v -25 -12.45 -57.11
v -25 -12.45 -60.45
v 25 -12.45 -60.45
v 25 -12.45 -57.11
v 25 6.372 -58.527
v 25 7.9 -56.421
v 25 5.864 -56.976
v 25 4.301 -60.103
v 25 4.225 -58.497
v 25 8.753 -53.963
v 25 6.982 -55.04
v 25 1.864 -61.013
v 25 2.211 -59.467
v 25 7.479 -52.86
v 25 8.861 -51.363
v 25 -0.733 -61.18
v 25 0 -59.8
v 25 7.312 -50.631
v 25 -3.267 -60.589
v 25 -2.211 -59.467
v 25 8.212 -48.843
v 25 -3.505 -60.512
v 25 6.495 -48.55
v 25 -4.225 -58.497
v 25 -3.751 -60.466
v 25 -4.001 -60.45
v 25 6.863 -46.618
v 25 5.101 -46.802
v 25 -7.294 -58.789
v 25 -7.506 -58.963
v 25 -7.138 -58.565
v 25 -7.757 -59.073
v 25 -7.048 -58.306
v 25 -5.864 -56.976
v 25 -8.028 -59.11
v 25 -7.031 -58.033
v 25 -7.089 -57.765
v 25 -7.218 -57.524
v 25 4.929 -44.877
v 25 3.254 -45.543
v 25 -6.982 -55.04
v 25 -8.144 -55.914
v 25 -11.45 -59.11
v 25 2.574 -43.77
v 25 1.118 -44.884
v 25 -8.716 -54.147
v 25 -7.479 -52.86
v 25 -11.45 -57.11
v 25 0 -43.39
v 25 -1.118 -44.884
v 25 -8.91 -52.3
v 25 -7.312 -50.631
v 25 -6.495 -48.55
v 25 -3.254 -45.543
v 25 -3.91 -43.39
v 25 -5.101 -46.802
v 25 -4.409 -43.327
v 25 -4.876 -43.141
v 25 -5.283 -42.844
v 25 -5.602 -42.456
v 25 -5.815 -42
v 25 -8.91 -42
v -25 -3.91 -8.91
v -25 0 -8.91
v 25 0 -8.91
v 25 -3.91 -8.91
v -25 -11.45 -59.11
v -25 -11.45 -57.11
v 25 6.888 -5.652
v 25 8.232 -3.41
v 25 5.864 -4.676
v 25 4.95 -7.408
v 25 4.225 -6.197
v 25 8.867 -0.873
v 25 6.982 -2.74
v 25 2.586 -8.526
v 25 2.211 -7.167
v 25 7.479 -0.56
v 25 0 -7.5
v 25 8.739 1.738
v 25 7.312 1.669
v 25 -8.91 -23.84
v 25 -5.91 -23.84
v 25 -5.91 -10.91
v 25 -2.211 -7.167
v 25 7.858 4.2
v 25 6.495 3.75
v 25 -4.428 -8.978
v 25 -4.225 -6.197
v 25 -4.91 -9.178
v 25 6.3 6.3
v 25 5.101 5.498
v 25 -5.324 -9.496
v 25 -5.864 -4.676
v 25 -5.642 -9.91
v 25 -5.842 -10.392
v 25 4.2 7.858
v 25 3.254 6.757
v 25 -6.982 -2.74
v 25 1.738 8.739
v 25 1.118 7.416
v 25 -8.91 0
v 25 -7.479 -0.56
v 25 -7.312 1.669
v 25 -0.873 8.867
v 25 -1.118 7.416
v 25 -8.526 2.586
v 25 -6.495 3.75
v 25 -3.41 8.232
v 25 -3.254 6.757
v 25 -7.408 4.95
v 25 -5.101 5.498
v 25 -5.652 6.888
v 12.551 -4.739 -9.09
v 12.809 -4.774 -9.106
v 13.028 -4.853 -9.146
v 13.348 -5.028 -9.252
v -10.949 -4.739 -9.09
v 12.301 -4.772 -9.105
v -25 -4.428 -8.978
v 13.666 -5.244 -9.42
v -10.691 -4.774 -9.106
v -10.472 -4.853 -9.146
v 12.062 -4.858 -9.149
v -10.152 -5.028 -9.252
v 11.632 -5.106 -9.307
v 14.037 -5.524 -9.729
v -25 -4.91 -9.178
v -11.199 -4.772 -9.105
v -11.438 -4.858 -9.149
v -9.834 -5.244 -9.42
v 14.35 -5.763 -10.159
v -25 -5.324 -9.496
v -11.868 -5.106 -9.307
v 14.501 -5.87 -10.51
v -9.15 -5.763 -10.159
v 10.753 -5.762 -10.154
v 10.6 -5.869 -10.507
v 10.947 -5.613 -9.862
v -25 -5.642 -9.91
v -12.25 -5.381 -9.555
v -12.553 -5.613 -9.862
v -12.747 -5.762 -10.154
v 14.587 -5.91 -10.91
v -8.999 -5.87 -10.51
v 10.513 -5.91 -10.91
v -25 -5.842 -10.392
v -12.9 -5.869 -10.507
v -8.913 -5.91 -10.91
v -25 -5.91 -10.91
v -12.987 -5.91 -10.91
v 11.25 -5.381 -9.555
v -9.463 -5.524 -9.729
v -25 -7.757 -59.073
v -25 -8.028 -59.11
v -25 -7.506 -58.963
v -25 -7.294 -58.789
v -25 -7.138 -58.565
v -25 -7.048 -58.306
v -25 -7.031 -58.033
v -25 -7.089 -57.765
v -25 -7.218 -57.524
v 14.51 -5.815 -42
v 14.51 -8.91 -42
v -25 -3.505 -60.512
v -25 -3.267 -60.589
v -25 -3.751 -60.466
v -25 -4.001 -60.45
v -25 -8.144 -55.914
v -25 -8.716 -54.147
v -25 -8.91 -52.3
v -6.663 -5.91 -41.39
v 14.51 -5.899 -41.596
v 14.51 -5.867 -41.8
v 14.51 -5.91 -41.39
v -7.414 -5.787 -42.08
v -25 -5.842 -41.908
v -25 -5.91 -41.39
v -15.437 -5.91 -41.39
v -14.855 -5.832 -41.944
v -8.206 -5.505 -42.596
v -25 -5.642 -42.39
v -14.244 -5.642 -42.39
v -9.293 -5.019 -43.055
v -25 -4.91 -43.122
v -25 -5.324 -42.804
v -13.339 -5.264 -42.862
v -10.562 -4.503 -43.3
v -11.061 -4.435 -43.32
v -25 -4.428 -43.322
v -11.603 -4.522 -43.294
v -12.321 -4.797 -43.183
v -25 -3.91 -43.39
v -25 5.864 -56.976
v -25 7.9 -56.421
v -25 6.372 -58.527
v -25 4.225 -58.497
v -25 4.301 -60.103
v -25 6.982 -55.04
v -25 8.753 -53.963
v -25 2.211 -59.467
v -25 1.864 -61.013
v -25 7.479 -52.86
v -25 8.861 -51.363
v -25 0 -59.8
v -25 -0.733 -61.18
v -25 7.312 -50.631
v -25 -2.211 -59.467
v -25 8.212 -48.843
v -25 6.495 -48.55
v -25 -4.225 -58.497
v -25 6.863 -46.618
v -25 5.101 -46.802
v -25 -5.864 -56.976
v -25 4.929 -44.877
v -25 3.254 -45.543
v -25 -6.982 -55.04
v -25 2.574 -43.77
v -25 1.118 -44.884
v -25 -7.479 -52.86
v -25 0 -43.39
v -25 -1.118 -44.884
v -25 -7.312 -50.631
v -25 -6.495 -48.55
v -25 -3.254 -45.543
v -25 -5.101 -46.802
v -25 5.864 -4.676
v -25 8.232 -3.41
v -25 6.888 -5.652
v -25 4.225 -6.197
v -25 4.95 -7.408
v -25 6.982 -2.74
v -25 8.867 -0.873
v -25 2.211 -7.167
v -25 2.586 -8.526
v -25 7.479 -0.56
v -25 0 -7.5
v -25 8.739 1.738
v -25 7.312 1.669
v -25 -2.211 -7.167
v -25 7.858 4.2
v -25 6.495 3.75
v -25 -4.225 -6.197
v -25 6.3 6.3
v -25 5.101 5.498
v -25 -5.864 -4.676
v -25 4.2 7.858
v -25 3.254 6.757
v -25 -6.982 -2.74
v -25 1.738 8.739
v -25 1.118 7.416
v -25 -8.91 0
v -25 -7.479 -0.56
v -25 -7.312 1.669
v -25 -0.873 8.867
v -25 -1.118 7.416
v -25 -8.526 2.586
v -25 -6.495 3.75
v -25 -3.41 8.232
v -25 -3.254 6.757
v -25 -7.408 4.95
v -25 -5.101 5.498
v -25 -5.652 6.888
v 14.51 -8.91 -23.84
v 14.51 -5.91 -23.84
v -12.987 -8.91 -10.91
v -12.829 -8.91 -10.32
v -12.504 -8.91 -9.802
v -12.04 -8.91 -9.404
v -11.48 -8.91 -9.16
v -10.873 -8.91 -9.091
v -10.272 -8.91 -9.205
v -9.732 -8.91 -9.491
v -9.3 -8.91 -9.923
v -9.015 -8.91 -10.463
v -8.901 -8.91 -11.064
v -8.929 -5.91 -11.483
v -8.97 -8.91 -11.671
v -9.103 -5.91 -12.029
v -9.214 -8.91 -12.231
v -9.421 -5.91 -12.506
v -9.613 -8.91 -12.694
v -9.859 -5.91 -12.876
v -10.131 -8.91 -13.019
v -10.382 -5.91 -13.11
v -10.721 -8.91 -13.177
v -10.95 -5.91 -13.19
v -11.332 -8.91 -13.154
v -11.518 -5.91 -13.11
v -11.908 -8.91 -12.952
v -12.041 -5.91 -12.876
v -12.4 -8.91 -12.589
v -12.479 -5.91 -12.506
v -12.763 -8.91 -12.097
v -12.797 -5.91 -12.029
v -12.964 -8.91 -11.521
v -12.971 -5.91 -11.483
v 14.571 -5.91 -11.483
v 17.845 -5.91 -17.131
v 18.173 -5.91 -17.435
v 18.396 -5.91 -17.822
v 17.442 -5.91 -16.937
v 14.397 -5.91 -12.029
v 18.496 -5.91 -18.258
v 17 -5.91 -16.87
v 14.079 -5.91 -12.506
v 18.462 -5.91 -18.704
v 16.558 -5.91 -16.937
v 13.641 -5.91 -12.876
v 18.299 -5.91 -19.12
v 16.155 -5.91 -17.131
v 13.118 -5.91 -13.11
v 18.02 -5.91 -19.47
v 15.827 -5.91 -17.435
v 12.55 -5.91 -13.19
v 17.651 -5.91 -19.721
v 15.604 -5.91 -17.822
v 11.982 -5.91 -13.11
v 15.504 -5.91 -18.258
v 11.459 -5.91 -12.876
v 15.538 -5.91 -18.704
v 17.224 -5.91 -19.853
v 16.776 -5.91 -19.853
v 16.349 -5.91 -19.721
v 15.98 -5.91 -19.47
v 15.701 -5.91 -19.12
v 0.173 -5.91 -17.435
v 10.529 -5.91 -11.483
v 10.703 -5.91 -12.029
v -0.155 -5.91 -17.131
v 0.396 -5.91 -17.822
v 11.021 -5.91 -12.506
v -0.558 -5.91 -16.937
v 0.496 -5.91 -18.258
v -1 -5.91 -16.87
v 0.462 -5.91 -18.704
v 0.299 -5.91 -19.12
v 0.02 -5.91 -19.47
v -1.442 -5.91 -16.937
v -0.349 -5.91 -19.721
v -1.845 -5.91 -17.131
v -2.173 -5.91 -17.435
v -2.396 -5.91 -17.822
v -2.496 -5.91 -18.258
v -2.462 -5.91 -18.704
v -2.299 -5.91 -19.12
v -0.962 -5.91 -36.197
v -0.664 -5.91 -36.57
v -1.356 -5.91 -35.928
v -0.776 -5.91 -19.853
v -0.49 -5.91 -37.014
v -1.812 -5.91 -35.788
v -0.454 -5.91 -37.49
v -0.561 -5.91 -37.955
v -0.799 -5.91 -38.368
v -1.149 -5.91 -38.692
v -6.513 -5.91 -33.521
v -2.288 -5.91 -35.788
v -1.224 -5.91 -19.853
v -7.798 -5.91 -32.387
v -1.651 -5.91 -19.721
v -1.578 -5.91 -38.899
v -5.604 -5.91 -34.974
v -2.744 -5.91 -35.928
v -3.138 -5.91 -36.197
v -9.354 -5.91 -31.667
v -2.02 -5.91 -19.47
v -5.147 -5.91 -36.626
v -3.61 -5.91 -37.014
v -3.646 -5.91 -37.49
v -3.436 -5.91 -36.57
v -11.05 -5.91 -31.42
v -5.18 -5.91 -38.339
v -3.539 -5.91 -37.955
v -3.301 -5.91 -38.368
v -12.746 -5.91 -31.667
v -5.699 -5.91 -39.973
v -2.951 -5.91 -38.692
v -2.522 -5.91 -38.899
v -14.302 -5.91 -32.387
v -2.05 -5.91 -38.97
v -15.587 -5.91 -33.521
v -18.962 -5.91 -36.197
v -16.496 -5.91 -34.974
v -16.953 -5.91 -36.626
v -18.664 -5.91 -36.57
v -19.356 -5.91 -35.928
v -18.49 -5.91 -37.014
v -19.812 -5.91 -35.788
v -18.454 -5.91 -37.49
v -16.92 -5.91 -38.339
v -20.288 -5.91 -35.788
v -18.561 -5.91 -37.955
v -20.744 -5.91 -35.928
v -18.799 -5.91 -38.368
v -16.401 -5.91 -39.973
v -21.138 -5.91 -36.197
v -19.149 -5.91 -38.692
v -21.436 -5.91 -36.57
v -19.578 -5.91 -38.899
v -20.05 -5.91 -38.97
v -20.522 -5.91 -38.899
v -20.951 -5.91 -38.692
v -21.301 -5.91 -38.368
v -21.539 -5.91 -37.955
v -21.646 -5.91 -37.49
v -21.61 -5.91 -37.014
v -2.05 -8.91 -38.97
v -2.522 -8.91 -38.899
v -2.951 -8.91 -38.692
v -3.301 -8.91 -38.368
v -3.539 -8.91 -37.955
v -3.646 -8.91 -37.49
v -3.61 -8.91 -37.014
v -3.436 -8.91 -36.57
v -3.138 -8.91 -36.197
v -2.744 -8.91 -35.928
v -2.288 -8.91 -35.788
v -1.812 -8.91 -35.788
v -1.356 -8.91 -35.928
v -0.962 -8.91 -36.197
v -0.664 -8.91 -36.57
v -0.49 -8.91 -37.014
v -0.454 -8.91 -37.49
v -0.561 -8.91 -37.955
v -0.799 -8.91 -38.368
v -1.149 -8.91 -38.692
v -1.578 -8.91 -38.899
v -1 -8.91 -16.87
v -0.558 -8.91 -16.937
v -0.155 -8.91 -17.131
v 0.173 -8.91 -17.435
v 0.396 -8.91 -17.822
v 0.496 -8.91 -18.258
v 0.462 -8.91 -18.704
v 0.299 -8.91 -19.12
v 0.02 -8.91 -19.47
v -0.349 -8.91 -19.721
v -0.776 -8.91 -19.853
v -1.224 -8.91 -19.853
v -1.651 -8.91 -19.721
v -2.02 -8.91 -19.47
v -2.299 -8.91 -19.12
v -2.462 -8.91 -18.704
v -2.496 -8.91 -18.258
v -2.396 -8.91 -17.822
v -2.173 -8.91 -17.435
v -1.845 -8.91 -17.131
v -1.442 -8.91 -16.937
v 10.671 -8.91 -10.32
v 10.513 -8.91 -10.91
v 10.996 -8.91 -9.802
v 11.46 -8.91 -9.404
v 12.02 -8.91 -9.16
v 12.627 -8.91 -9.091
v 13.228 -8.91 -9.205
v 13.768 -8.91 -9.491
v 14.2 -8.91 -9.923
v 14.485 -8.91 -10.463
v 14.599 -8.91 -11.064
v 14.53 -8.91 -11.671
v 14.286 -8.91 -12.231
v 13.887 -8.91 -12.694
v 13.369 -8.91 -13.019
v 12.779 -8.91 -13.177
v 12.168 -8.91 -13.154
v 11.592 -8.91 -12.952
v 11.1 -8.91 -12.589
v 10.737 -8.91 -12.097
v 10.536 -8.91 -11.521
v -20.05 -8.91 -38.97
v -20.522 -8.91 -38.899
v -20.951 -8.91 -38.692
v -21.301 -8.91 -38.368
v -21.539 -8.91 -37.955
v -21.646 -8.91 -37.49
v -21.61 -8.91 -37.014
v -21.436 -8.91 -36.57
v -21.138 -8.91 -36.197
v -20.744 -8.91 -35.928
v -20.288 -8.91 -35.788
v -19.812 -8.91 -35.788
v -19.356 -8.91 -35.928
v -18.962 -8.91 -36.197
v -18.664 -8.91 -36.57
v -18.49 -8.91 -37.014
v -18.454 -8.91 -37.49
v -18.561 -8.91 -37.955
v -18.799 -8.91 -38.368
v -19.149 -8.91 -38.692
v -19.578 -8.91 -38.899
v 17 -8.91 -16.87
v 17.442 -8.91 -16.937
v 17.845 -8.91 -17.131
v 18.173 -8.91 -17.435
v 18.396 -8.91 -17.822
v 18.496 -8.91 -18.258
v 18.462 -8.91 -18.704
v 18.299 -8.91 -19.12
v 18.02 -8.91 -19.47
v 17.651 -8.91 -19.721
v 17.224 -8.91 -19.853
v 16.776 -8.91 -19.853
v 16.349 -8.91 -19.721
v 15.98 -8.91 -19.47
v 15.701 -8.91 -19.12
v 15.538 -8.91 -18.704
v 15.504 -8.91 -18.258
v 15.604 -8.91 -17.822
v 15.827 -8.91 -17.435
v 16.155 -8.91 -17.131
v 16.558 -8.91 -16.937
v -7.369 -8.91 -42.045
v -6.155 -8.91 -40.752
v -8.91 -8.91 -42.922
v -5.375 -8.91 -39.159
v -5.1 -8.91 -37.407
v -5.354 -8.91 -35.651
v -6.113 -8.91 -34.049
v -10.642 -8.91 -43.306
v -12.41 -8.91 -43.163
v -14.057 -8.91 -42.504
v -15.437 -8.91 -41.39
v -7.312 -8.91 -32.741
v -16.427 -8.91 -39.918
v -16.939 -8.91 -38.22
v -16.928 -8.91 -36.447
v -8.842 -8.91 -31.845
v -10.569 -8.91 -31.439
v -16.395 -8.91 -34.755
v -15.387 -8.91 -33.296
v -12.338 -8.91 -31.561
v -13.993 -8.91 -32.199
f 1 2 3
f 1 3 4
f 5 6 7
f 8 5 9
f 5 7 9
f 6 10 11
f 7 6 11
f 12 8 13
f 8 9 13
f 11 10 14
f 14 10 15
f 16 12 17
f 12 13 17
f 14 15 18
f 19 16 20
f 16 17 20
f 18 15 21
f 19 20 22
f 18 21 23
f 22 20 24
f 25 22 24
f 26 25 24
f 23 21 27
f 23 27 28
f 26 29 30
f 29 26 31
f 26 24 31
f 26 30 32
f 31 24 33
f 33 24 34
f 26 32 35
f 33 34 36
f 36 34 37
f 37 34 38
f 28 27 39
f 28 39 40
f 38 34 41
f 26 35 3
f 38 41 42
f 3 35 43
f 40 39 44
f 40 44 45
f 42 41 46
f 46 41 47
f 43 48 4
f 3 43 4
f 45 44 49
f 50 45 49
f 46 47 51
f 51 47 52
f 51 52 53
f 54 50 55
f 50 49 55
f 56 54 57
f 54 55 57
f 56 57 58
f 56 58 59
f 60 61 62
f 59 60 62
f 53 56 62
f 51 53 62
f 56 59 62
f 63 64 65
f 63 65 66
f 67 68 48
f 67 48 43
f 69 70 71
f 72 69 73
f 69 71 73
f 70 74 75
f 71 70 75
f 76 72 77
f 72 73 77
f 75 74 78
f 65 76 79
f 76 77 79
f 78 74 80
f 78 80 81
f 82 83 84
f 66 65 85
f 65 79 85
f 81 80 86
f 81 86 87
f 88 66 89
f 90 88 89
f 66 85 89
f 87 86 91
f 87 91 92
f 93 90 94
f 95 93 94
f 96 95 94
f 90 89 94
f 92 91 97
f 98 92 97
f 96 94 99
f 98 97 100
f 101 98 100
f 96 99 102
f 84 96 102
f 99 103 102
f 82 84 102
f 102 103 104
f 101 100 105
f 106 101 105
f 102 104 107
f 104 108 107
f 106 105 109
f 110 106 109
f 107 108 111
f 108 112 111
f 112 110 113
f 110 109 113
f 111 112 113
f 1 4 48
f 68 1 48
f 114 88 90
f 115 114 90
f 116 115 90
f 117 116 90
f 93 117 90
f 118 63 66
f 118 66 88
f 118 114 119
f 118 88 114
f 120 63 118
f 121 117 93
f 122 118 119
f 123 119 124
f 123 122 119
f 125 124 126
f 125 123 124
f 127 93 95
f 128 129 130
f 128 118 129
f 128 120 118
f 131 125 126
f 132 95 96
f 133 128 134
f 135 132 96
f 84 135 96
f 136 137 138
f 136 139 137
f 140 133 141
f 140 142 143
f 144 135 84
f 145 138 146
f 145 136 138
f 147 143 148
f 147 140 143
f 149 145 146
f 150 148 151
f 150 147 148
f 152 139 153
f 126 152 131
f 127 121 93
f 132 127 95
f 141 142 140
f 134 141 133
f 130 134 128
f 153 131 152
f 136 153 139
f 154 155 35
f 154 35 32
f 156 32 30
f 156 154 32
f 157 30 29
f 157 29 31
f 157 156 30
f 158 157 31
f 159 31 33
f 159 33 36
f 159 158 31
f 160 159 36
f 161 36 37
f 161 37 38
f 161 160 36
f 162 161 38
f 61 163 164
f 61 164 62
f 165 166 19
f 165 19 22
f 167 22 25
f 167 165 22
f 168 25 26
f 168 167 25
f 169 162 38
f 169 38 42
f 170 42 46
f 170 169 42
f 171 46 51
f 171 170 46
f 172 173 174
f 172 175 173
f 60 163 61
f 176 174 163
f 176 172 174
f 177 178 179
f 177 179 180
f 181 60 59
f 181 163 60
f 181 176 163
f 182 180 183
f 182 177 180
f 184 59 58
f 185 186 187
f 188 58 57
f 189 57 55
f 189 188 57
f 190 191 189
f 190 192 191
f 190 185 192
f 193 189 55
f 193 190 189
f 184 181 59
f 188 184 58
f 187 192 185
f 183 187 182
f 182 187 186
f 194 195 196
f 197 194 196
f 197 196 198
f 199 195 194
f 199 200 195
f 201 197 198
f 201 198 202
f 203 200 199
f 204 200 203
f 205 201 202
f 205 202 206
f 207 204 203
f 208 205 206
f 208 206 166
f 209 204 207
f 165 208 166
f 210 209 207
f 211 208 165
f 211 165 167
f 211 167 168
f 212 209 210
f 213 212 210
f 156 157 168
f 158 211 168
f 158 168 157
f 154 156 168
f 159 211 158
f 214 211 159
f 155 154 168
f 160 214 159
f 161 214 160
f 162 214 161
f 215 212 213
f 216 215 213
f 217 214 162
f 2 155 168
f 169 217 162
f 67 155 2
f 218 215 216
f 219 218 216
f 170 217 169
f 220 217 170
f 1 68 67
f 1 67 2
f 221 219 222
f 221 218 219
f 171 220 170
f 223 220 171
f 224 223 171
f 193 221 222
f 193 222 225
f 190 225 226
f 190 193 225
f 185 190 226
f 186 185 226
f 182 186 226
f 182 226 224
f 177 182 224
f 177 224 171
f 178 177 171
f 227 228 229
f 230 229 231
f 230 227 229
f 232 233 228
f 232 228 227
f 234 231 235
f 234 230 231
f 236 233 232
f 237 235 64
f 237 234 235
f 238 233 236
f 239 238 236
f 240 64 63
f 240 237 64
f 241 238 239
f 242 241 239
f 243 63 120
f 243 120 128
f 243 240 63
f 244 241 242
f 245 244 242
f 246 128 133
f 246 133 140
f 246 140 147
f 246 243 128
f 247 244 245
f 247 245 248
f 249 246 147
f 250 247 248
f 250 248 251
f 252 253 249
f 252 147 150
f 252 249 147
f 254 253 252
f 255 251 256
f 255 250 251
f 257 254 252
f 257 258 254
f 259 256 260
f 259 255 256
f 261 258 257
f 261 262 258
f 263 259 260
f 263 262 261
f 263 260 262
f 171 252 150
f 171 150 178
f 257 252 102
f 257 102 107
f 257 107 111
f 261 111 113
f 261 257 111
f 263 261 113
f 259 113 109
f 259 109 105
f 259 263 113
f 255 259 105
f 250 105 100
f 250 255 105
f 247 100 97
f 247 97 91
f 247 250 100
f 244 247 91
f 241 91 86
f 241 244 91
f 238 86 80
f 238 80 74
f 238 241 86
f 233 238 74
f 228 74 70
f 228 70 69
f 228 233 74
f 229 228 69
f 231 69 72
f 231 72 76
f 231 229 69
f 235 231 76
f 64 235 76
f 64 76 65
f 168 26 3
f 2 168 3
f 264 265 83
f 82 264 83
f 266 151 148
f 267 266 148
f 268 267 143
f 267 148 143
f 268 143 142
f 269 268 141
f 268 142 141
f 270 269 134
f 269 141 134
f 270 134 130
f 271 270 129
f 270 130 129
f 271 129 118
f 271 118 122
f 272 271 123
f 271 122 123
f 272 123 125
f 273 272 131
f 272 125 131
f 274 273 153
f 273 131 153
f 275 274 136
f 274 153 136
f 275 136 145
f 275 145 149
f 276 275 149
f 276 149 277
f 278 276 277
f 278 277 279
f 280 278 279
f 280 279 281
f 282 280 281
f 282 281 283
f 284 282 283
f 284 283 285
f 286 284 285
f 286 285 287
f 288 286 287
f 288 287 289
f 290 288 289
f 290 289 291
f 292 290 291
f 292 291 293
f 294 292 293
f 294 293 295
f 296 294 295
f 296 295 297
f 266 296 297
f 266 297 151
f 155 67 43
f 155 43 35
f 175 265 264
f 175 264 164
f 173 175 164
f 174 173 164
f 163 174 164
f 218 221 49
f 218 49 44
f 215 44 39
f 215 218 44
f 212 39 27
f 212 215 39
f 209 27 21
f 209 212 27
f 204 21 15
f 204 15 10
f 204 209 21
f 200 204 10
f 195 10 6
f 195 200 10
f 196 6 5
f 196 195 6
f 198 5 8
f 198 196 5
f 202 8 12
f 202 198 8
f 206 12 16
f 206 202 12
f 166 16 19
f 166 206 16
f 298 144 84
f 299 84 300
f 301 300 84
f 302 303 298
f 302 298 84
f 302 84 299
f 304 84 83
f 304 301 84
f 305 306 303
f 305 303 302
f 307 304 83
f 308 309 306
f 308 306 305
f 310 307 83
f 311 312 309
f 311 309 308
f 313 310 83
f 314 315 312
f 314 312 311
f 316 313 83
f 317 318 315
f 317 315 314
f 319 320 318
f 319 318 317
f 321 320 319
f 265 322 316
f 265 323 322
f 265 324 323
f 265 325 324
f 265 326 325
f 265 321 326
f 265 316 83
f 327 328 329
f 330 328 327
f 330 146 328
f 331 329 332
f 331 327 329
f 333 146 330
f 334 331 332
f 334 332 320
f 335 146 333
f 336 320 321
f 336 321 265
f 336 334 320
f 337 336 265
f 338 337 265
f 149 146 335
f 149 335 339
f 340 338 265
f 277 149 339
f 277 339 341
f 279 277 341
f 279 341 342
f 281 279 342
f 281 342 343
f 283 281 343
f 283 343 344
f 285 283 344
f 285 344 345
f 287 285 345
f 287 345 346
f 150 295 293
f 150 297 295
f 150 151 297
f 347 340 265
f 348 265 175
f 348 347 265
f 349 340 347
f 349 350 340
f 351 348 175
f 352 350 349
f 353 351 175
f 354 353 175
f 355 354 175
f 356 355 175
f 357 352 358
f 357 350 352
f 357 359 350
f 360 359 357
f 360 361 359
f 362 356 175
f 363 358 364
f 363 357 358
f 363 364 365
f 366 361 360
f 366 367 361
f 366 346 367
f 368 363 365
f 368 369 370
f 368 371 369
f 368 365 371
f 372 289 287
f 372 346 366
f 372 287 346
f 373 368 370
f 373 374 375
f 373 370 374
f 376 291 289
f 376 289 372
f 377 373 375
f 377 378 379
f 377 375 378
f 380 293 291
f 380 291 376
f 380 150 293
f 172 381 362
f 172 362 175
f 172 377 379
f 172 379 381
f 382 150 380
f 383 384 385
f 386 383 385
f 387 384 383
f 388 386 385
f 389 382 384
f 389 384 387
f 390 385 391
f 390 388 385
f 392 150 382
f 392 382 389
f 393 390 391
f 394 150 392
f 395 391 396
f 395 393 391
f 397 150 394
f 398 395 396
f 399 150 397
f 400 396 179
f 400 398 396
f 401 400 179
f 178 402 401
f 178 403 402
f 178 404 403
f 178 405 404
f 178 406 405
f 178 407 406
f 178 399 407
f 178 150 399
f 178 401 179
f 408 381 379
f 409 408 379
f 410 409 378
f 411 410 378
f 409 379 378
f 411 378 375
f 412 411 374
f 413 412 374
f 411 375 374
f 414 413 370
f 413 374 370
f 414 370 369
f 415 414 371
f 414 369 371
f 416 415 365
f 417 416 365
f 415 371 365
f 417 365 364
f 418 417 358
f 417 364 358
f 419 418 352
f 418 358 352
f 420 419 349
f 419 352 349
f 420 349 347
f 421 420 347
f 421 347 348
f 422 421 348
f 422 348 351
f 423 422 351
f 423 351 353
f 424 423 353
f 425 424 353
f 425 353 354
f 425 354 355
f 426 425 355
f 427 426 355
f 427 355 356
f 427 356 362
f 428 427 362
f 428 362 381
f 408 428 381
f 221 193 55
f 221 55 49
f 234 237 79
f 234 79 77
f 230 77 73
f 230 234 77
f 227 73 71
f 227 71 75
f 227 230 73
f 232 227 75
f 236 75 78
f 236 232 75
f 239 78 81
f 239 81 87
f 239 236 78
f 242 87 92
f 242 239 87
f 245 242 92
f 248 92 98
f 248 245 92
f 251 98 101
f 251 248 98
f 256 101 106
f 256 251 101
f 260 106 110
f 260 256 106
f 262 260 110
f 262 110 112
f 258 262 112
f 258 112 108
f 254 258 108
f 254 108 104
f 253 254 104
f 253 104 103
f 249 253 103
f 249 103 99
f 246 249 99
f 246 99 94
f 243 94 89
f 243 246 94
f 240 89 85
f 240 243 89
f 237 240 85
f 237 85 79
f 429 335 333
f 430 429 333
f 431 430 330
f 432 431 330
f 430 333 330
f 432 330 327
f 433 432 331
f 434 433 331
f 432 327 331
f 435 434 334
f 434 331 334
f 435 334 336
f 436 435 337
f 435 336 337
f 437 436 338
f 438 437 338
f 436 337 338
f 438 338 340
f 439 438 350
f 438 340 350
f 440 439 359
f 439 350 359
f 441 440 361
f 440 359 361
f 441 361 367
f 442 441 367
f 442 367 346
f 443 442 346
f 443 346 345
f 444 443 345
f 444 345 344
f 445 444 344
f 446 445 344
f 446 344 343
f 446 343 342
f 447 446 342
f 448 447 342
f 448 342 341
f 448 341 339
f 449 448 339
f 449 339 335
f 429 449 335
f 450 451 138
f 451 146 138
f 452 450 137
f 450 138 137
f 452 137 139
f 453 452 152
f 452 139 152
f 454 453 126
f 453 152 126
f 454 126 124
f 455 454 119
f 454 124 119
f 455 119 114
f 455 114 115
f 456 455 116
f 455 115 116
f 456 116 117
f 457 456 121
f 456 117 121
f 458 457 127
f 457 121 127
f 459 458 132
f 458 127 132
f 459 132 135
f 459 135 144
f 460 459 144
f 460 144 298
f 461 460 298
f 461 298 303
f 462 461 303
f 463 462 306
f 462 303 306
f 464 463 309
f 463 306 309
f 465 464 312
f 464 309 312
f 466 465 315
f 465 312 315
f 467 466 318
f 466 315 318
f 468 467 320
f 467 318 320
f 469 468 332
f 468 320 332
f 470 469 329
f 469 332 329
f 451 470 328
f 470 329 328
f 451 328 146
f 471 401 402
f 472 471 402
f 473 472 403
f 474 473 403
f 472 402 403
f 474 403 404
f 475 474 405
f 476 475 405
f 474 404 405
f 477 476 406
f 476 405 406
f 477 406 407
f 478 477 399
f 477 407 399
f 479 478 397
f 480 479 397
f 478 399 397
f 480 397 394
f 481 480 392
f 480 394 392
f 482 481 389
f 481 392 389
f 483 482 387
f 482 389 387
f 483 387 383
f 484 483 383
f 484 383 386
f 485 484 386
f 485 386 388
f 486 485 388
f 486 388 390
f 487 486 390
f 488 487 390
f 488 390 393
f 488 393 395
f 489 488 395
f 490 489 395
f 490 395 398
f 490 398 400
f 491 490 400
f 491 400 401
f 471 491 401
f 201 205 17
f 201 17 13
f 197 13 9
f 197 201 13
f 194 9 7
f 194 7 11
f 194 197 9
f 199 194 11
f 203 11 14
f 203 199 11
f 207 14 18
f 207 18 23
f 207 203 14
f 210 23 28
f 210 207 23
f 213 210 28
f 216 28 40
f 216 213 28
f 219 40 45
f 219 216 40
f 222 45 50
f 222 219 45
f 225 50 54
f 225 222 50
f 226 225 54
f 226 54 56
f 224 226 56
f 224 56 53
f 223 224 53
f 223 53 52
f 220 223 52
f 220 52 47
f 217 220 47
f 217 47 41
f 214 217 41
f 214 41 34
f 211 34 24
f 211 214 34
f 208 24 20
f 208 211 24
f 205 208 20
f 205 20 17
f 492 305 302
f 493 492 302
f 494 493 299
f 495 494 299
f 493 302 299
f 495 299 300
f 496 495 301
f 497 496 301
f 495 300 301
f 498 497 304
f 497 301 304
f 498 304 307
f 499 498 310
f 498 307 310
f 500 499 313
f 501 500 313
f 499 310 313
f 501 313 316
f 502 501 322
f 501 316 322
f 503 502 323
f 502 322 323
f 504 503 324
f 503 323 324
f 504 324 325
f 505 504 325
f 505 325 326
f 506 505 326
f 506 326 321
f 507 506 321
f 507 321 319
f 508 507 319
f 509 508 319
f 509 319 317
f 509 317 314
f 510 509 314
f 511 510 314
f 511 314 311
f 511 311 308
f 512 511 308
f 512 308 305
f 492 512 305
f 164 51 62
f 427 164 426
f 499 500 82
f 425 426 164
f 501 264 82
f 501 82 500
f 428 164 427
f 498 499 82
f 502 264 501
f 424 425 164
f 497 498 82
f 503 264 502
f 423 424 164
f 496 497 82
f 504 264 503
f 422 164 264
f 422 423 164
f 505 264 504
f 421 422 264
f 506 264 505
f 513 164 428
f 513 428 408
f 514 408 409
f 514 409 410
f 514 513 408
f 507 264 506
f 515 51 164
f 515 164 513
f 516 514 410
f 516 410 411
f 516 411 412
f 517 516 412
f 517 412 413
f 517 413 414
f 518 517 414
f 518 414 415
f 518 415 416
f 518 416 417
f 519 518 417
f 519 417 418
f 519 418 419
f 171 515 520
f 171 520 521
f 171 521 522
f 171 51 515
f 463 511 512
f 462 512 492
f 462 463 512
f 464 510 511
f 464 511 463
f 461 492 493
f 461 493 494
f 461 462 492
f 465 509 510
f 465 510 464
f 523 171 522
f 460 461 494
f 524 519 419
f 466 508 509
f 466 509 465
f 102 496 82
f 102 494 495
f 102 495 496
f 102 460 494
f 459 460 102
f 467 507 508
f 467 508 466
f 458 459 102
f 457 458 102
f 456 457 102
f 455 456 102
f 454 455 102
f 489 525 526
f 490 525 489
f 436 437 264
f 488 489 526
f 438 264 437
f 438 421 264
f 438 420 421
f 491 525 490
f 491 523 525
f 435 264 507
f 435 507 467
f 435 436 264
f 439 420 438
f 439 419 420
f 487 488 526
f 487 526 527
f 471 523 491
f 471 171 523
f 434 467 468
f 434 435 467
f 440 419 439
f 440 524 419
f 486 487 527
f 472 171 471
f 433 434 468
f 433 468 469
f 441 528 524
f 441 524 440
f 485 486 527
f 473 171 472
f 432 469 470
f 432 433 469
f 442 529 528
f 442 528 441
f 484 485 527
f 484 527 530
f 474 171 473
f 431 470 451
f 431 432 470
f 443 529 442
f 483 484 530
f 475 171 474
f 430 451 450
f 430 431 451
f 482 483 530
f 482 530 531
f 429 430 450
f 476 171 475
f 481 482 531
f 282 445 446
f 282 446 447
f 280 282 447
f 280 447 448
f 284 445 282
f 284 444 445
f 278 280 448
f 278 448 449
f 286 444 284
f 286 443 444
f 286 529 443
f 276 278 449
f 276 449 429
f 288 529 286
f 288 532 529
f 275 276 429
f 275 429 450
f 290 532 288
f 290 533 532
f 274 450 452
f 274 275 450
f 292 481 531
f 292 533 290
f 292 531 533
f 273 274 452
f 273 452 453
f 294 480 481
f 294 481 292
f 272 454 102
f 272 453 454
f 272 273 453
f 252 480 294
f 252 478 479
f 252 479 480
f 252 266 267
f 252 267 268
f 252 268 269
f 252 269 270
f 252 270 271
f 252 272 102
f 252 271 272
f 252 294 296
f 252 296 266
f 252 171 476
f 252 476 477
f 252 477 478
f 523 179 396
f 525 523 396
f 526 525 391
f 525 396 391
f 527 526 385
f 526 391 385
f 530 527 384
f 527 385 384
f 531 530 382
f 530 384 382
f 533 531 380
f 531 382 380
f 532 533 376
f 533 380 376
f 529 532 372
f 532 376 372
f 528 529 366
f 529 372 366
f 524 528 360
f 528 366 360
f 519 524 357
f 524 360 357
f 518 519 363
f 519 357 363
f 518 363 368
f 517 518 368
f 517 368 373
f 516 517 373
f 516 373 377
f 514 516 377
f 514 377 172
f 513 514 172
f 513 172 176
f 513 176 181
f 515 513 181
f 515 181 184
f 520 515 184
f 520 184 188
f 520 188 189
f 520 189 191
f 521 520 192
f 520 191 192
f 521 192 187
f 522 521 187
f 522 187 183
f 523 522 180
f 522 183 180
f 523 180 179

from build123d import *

# Parameters (mm, degrees)
EXTRUDE_1_DEPTH      = 25
EXTRUDE_1_DEPTH_BACK = 25
SKETCH_1_R           = 7.5
SKETCH_2_R           = 1.6
SKETCH_2_R_2         = 5.95
SKETCH_2_W           = 10.49
SKETCH_2_H           = 18.16
EXTRUDE_2_DEPTH      = 25
SKETCH_3_R           = 2.05
EXTRUDE_3_DEPTH      = 25
SKETCH_4_R           = 1.5
EXTRUDE_4_DEPTH      = 10


with BuildPart() as part:
    # Эскиз1 → Выдавливание1 (new, two sides: drawn at the far end of the back side and taken through both)
    with BuildSketch(Plane.YZ.offset(-EXTRUDE_1_DEPTH_BACK)):
        with BuildLine():
            Line((-8.91, -52.3), (-8.91, 0))
            ThreePointArc((-8.91, 0), (6.30032142, 6.30032142), (0, -8.91))
            Line((0, -8.91), (-3.91, -8.91))
            ThreePointArc((-3.91, -8.91), (-5.324213562, -9.495786438), (-5.91, -10.91))
            Line((-5.91, -10.91), (-5.91, -41.39))
            ThreePointArc((-5.91, -41.39), (-5.324213562, -42.804213562), (-3.91, -43.39))
            Line((-3.91, -43.39), (0, -43.39))
            ThreePointArc((0, -43.39), (8.753455219, -53.962865516), (-3.2672994, -60.589321723))
            ThreePointArc((-3.2672994, -60.589321723), (-3.627441686, -60.48513912), (-4.000699939, -60.45))
            Line((-4.000699939, -60.45), (-12.45, -60.45))
            Line((-12.45, -60.45), (-12.45, -57.11))
            Line((-12.45, -57.11), (-11.45, -57.11))
            Line((-11.45, -57.11), (-11.45, -59.11))
            Line((-11.45, -59.11), (-8.028200296, -59.11))
            ThreePointArc((-8.028200296, -59.11), (-7.137617204, -58.564820575), (-7.218089268, -57.523723512))
            ThreePointArc((-7.218089268, -57.523723512), (-8.476475546, -55.045443919), (-8.91, -52.3))
        make_face()
        with Locations(Location((0, 0, 0), (0, 0, 270))):
            Circle(SKETCH_1_R, mode=Mode.SUBTRACT)
        with Locations(Location((0, -52.3, 0), (0, 0, 270))):
            Circle(SKETCH_1_R, mode=Mode.SUBTRACT)
    extrude(amount=EXTRUDE_1_DEPTH + EXTRUDE_1_DEPTH_BACK)

    # Эскиз2 → Выдавливание2 (cut, symmetric)
    with BuildSketch(Plane(origin=(-25, -5.91, -8.91), x_dir=(1, 0, 0), z_dir=(0, 1, 0))):
        with Locations(Location((4.95, 28.46, 0), (0, 0, 90))):
            Circle(SKETCH_2_R)
        with Locations(Location((22.95, 28.46, 0), (0, 0, 90))):
            Circle(SKETCH_2_R)
        with Locations(Location((13.95, 28.46, 0), (0, 0, 137.496887959))):
            Circle(SKETCH_2_R_2)
        with Locations((44.755, 24.01)):
            Rectangle(SKETCH_2_W, SKETCH_2_H)
    extrude(amount=EXTRUDE_2_DEPTH, both=True, mode=Mode.SUBTRACT)

    # Эскиз3 → Выдавливание3 (cut, symmetric)
    with BuildSketch(Plane(origin=(0, -5.91, 0), x_dir=(-1, 0, 0), z_dir=(0, 1, 0))):
        with Locations(Location((10.95, -11.14, 0), (0, 0, 6.441870255))):
            Circle(SKETCH_3_R)
        with Locations(Location((-12.55, -11.14, 0), (0, 0, 6.441870255))):
            Circle(SKETCH_3_R)
    extrude(amount=EXTRUDE_3_DEPTH, both=True, mode=Mode.SUBTRACT)

    # Эскиз4 → Выдавливание4 (cut)
    with BuildSketch(Plane(origin=(0, -5.91, 0), x_dir=(-1, 0, 0), z_dir=(0, 1, 0))):
        with Locations(Location((-17, -18.37, 0), (0, 0, 90))):
            Circle(SKETCH_4_R)
        with Locations(Location((1, -18.37, 0), (0, 0, 90))):
            Circle(SKETCH_4_R)
    extrude(amount=-EXTRUDE_4_DEPTH, mode=Mode.SUBTRACT)


solid = part.part
